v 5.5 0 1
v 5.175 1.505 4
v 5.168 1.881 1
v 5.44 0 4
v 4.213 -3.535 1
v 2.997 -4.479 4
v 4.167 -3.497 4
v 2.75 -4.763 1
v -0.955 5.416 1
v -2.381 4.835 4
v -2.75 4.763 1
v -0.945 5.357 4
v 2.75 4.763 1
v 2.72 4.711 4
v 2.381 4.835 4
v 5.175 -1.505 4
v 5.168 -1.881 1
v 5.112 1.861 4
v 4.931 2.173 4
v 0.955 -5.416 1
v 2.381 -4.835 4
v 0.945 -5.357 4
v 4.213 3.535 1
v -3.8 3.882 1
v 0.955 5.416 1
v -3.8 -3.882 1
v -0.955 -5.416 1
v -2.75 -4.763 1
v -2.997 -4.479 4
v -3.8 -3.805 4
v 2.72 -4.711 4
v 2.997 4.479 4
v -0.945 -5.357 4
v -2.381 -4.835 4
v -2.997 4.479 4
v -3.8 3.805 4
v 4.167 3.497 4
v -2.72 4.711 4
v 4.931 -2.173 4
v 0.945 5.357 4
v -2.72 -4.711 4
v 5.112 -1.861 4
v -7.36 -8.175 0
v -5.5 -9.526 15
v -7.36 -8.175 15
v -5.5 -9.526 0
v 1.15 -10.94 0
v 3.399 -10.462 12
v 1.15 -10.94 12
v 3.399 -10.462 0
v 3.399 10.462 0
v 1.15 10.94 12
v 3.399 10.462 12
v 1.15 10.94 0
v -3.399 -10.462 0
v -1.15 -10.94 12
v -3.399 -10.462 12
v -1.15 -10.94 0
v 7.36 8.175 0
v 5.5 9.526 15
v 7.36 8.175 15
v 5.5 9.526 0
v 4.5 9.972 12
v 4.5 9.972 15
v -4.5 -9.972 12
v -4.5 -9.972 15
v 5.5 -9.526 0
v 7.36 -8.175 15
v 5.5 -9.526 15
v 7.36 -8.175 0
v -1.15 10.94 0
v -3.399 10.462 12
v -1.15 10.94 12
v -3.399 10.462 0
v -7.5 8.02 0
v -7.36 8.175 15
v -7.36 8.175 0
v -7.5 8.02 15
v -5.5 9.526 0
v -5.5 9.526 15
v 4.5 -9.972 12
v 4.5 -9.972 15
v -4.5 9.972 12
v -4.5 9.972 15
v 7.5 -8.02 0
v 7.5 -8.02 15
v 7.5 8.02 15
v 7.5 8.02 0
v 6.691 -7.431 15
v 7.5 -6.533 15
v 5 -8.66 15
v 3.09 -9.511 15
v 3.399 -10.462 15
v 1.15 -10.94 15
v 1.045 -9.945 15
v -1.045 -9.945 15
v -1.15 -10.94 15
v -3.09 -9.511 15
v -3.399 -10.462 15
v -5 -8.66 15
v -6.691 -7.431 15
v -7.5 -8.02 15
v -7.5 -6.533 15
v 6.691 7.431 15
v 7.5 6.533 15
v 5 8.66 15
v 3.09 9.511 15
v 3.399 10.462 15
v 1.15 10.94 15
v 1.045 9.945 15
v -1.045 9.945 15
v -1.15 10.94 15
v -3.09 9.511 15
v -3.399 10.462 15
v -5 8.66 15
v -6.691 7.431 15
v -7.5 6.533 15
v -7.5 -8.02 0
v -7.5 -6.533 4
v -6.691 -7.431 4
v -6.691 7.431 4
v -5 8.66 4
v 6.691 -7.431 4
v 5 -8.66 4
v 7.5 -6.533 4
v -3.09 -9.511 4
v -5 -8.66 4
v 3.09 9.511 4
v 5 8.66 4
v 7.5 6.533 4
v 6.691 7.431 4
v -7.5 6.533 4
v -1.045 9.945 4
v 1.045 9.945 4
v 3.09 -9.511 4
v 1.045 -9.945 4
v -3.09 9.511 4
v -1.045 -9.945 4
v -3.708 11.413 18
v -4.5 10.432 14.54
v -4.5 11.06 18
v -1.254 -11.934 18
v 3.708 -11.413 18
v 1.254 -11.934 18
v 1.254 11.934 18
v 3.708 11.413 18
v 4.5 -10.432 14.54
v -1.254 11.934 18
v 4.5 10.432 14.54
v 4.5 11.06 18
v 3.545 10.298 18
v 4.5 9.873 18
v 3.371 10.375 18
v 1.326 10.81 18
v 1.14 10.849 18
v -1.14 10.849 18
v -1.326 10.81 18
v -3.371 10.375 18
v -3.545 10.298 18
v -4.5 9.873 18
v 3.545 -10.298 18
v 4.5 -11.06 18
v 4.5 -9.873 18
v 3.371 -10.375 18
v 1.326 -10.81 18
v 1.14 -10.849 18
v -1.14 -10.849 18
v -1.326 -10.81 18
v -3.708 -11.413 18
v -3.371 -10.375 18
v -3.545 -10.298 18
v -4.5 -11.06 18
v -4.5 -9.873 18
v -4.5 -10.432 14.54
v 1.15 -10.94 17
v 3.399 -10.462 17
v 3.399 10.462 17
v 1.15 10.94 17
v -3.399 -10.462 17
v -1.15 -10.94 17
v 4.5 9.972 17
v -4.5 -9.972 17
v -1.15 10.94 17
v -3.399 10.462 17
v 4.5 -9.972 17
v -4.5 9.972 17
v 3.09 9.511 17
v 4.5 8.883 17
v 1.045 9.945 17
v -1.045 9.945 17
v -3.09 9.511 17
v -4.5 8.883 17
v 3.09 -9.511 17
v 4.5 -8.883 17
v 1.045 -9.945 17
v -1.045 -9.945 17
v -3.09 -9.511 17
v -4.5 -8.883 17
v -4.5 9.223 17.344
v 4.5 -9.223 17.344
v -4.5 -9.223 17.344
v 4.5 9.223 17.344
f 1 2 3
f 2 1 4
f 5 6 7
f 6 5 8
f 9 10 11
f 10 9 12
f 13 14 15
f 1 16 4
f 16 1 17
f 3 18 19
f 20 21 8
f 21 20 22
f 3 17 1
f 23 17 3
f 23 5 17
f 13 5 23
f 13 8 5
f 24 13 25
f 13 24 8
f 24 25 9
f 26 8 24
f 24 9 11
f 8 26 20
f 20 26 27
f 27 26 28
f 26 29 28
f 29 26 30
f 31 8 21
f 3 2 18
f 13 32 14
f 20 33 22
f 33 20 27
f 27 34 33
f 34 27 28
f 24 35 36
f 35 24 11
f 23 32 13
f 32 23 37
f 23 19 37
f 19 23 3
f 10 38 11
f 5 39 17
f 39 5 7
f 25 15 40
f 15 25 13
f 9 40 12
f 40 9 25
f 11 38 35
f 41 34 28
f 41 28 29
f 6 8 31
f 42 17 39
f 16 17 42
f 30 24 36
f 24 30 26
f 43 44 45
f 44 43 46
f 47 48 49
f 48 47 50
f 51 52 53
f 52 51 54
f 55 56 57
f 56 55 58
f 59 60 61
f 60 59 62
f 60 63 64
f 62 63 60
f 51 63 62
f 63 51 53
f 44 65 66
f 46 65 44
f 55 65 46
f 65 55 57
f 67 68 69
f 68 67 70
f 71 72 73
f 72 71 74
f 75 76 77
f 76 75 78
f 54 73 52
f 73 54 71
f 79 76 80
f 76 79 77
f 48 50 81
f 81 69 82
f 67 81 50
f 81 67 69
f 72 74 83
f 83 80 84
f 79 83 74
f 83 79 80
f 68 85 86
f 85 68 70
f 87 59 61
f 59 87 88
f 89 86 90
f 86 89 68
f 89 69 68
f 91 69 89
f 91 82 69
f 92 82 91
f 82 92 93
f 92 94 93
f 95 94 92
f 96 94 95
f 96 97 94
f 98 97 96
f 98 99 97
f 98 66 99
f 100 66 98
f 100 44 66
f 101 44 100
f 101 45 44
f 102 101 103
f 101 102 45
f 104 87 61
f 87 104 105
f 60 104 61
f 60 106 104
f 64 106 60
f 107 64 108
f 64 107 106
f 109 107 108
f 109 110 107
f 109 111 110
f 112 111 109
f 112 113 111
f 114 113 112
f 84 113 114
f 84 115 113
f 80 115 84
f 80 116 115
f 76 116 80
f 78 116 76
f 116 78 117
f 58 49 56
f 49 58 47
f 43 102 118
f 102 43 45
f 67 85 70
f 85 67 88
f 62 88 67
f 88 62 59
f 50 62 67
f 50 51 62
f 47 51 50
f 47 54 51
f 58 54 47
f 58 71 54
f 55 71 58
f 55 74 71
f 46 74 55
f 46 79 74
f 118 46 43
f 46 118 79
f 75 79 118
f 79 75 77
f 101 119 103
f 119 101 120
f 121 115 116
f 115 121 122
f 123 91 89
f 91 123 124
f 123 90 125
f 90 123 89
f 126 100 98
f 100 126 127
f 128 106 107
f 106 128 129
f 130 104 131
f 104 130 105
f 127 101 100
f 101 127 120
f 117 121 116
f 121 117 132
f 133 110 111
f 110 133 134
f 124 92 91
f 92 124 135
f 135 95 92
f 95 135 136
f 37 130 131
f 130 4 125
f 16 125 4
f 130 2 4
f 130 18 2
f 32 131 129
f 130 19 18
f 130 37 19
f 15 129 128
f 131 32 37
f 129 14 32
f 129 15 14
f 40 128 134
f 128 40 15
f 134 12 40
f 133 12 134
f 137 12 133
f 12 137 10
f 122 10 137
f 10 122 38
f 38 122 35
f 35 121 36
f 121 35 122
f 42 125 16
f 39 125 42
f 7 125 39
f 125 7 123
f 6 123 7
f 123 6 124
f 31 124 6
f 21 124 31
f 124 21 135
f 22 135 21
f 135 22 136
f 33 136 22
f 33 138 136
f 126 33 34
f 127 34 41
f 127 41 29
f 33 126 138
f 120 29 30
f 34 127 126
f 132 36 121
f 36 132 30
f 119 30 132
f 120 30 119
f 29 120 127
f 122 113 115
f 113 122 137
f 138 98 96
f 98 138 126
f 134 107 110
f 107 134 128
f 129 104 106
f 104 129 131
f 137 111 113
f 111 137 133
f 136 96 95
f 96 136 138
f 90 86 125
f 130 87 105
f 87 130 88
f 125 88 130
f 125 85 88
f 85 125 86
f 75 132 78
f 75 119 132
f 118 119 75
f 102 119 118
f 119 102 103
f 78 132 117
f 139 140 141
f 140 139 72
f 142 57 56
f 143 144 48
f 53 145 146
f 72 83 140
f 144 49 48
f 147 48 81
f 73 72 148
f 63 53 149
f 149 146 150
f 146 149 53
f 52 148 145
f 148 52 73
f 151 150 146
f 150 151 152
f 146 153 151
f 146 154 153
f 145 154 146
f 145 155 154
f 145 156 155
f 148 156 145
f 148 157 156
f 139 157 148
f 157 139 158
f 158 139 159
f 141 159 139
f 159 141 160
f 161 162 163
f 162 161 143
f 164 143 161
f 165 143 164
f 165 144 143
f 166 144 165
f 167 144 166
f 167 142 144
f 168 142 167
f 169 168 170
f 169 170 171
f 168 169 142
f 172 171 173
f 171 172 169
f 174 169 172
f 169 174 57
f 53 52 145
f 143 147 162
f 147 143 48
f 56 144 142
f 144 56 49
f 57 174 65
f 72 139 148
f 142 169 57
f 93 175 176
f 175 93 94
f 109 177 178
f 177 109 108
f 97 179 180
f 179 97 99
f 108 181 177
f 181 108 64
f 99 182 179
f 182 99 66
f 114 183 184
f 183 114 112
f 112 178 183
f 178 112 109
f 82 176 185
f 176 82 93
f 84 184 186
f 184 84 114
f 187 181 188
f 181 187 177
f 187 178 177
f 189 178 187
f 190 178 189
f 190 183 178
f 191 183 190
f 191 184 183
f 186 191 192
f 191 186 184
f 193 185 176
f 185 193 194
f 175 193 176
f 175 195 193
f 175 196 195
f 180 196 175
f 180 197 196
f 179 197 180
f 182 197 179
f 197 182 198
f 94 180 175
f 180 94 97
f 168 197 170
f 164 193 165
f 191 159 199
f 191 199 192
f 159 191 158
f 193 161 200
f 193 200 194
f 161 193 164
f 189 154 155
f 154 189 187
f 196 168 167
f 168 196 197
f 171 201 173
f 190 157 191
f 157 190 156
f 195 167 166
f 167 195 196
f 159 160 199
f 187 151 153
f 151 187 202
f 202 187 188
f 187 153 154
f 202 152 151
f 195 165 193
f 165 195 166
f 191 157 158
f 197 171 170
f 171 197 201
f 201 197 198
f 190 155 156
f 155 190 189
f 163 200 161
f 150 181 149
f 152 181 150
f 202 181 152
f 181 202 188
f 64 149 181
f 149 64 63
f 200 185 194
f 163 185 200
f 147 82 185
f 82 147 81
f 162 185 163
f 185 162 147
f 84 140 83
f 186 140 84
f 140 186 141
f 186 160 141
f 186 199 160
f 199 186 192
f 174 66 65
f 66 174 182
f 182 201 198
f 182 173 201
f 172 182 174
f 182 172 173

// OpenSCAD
// file: MotorTopMount.scad
module TopMotorMount(){
    difference(){
        union(){
            cylinder(15, 11,11);
            translate([0,0,12]) {
                intersection(){
                    difference(){
                        cylinder(6,11,12);
                        translate([0,0,3]){
                            cylinder(2, 11,11);
                        }
                        translate([0,0,5]){
                            cylinder(1.1, 10,11);
                        }
                    }
                    translate([-4.5,-50,0]){
                        cube([9,100,100]);
                    }
                }

            }
        }
        
        
        translate([0,0,1
        ]){
            cylinder(30,10,10);
        }
        translate([0,0,-1]){
                cylinder(15, 3.5,3.5, $fn = 100);
        }
        translate([7.5,-11,-1]){
            cube([8, 22,20]);
        }
        rotate([0,0,180]){
            translate([7.5,-11,-1]){
                cube([8, 22,20]);
            }
        }
    }
}

TopMotorMount();
// file: MotorBaseMount.scad
module BaseMotorMount(){
    difference(){ 
        cylinder(15, 11,11);
        translate([0,0,4]){
            cylinder(15,10,10);
        }
        translate([0,0,1]){
            difference(){
                cylinder(15, 5.5,5.2);
                rotate([0,0,180]){
                    translate([3.8,-12,-1]){
                        cube([8, 22,20]);
                    }
                }
            }
        }
        translate([7.5,-12,-1]){
            cube([8, 22,20]);
        }
        rotate([0,0,180]){
            translate([7.5,-12,-1]){
                cube([8, 22,20]);
            }
        }
        translate([-5,-50,11]){
            cube([10,100,2]);
        }
    }
}

BaseMotorMount();
// main file
//cube([45,60,2]);
include <MotorBaseMount.scad>
include <MotorTopMount.scad>





TopMotorMount();
